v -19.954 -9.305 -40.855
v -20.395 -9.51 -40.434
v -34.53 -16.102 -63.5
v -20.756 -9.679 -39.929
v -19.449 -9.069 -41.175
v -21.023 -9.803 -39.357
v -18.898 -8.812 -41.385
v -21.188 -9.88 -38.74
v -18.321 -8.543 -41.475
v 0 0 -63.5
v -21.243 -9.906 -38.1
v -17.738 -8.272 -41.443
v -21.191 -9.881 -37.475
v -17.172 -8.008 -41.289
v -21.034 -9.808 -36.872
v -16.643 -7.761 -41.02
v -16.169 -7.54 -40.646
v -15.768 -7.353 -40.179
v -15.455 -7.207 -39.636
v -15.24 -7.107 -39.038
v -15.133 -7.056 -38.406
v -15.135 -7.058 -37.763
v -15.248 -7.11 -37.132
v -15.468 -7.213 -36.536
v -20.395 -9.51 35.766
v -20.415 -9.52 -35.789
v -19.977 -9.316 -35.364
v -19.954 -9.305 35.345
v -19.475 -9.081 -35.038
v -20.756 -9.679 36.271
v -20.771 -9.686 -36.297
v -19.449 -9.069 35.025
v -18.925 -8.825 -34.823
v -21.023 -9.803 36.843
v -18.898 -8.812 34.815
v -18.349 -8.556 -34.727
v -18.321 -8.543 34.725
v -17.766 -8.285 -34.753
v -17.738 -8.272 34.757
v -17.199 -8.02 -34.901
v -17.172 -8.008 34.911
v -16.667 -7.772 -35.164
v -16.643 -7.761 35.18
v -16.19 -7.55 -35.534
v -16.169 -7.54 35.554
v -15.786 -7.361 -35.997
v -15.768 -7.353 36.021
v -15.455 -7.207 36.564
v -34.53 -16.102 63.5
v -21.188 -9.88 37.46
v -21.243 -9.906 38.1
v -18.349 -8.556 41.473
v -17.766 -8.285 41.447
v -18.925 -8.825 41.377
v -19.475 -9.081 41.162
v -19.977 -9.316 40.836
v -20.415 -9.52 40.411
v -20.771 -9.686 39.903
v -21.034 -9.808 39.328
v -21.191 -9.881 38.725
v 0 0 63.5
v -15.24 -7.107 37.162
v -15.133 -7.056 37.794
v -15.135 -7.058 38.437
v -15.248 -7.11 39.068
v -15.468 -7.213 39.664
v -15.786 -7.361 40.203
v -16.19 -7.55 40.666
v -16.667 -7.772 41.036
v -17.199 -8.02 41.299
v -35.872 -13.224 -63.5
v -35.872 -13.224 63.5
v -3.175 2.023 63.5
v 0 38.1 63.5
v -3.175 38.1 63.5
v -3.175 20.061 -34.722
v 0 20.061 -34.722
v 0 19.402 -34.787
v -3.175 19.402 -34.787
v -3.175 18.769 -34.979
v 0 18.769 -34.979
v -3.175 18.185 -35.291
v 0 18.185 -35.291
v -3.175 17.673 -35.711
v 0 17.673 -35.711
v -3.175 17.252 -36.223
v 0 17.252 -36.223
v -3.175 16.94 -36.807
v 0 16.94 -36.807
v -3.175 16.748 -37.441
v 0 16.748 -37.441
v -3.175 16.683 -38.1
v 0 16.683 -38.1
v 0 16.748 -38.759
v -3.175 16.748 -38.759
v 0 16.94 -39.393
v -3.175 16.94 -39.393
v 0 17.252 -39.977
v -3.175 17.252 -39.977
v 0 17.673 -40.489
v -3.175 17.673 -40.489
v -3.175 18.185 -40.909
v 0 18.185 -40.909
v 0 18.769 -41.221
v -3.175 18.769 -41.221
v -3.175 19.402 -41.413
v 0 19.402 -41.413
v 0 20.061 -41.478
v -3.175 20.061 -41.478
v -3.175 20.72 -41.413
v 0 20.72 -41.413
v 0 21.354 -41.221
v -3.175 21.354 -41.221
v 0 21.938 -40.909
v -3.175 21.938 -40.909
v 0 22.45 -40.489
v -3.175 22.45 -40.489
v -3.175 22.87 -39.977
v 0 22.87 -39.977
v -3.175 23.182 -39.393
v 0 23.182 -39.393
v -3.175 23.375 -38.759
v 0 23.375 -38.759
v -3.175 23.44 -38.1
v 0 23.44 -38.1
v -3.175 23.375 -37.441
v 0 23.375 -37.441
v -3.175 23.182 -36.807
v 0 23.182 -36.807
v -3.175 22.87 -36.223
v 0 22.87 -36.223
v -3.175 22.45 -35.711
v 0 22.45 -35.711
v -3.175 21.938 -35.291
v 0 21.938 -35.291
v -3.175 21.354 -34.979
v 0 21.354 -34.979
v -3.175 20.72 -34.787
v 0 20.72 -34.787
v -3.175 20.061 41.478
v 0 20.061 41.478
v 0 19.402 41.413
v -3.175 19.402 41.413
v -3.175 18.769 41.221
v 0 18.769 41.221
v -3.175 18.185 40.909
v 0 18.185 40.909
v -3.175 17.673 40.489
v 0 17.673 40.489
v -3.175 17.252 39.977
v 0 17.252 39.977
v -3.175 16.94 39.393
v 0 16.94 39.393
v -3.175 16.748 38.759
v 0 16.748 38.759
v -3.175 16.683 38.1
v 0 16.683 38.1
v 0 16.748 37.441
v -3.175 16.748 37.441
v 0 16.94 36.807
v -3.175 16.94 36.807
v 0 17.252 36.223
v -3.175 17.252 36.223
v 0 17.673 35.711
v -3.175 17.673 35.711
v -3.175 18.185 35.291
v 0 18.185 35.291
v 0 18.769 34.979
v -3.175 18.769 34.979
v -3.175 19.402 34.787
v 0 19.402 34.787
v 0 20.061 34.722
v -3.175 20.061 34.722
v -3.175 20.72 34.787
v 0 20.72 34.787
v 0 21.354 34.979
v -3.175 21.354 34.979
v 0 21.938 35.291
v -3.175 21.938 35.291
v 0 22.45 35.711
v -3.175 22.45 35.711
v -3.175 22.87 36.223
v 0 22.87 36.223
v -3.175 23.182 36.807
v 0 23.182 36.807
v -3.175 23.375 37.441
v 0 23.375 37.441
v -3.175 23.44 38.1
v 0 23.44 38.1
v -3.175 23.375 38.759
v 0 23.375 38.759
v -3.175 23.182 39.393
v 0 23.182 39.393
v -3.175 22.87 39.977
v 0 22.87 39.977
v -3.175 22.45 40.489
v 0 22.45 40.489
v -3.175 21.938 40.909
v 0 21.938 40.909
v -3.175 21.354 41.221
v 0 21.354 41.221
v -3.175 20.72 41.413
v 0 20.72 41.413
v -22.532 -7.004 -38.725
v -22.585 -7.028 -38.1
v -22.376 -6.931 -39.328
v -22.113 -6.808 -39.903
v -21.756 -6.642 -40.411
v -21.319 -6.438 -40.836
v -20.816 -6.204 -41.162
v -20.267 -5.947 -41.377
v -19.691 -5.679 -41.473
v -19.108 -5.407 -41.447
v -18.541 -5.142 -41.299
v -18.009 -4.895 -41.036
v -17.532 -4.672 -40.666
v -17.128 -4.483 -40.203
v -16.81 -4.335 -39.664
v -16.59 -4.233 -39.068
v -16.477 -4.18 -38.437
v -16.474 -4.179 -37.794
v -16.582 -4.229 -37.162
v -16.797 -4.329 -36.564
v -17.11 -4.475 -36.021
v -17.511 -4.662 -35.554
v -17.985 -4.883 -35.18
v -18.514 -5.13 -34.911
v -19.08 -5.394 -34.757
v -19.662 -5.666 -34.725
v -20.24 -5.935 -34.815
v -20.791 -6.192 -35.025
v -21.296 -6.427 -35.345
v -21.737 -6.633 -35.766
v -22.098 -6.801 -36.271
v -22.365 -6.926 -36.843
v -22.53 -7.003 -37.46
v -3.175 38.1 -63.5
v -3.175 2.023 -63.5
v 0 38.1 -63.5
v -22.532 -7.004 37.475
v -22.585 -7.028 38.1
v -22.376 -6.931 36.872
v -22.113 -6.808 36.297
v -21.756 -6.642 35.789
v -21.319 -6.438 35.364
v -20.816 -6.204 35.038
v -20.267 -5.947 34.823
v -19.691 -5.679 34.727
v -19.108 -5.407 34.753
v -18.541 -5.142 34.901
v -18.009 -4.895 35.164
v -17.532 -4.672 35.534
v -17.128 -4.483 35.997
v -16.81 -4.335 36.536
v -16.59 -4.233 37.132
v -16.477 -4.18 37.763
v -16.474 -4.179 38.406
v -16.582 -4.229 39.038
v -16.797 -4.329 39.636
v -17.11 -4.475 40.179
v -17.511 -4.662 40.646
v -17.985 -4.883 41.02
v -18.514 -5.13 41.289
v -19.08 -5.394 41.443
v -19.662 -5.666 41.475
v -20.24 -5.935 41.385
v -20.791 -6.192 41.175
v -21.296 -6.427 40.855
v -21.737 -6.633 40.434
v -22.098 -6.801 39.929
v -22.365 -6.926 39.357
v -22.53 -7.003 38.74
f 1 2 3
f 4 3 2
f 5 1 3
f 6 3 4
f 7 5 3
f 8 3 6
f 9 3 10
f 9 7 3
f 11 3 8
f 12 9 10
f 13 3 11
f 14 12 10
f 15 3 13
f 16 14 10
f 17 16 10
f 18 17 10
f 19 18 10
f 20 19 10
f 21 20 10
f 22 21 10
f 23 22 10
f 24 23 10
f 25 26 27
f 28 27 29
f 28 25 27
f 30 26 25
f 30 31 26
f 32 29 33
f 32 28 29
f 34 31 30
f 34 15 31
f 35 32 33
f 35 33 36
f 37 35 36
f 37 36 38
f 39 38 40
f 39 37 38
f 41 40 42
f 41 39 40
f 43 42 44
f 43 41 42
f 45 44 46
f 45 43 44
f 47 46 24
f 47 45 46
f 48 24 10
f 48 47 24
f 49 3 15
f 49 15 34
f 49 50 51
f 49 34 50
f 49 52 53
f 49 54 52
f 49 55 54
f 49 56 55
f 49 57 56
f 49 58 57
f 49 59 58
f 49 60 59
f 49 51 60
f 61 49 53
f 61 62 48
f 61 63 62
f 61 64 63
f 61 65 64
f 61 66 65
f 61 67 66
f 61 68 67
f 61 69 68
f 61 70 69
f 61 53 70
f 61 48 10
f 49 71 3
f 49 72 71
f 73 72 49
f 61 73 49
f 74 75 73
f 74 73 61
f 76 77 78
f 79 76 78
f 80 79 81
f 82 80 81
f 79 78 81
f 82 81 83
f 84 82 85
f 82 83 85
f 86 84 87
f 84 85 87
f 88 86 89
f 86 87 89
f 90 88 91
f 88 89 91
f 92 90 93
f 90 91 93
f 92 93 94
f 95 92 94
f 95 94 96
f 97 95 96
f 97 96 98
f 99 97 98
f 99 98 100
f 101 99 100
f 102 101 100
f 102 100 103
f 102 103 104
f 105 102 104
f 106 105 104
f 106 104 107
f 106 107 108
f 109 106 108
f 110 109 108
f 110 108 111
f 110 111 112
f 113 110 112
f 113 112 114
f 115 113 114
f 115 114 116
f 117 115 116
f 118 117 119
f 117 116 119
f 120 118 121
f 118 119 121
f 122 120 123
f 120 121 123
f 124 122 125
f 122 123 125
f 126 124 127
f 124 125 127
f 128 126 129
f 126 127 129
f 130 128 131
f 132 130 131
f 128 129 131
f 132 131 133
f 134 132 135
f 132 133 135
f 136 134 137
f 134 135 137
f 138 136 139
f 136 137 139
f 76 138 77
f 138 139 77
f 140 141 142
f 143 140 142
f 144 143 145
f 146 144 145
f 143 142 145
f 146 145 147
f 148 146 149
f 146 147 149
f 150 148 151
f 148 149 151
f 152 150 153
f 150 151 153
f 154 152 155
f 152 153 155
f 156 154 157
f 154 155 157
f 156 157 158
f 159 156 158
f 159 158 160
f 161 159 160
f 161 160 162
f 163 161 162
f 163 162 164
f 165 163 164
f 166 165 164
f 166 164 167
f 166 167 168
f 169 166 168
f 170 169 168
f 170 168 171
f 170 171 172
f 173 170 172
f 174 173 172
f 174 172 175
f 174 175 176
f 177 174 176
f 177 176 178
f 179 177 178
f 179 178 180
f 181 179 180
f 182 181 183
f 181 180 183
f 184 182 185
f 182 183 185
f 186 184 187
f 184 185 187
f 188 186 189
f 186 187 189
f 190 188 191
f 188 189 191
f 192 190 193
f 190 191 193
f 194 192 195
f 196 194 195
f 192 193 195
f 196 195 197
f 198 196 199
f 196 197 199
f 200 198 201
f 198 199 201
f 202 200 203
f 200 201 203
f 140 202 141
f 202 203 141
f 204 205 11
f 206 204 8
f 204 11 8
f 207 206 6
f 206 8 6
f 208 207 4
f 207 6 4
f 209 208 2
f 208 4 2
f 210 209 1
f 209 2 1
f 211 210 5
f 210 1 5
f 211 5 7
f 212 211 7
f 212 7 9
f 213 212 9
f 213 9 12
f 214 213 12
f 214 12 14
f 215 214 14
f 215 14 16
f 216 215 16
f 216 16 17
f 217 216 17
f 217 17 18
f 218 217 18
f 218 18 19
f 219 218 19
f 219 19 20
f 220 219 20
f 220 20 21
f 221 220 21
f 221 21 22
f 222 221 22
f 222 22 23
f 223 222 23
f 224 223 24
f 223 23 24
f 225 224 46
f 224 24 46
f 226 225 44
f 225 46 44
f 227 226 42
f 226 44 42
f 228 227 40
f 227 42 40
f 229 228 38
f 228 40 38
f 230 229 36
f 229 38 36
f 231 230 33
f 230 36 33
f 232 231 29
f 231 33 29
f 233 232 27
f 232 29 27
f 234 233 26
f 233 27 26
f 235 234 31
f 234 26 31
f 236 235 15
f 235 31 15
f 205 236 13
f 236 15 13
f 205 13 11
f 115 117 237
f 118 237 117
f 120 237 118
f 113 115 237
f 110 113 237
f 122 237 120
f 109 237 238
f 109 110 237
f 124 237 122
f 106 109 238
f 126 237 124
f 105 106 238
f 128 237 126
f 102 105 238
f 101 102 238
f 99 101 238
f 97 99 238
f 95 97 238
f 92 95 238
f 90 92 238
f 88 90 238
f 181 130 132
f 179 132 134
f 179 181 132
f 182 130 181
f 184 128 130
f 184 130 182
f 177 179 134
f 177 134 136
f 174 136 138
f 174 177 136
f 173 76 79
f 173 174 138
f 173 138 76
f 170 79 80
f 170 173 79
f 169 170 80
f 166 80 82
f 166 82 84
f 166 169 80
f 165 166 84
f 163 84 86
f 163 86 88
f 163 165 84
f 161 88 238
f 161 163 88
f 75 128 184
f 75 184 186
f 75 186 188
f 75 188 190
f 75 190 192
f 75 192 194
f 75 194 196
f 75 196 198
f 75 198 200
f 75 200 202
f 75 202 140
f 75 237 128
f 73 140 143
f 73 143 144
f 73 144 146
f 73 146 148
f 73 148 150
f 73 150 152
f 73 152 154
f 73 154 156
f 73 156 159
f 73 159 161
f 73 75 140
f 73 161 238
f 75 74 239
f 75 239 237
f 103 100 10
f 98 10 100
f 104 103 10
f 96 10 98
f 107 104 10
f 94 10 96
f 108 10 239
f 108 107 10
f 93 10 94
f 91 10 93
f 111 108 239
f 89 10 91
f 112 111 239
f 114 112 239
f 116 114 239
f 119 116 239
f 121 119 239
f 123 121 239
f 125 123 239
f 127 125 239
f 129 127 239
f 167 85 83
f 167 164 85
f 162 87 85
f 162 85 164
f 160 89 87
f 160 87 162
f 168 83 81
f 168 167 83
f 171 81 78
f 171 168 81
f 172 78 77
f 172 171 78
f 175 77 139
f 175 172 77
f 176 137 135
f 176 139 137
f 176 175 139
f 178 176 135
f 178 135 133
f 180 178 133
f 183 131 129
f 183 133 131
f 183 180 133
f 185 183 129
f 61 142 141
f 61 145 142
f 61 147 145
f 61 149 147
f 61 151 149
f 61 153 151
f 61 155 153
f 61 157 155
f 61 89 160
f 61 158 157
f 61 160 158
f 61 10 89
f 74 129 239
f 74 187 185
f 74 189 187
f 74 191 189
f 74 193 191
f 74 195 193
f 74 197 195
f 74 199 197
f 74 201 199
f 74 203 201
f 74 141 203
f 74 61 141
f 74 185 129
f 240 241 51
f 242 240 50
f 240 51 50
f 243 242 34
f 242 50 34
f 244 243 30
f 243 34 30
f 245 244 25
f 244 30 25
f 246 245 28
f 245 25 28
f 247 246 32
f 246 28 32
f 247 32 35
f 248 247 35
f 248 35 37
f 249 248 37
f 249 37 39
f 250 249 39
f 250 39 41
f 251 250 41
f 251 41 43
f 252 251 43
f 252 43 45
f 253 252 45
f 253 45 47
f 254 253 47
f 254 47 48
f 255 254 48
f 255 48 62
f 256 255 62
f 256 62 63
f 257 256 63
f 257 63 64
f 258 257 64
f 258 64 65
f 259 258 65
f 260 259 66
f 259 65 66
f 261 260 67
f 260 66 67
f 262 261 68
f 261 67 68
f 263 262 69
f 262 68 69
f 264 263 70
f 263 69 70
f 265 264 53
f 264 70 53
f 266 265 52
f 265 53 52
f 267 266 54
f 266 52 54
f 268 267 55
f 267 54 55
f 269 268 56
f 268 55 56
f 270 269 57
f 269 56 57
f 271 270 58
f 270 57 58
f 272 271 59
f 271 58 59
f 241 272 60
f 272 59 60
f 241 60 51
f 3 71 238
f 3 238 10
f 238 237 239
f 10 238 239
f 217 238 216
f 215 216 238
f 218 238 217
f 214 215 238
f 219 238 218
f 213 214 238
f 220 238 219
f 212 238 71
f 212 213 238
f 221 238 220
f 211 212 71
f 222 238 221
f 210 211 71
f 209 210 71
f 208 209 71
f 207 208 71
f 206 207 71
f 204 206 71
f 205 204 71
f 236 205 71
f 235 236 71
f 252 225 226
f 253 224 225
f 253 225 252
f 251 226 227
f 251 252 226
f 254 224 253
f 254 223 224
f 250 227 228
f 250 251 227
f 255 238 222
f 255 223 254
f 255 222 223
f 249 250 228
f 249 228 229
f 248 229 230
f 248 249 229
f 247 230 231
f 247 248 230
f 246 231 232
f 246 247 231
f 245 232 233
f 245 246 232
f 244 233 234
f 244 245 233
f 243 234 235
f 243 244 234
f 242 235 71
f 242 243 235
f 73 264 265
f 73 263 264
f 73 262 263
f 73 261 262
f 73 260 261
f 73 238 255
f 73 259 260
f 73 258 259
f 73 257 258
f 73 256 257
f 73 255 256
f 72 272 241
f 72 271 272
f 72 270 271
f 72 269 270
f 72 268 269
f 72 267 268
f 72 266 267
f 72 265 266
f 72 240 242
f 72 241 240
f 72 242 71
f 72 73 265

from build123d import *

# Parameters (mm, degrees)
BOSS_EXTRUDE1_DEPTH               = 63.5
F_1_4_CLEARANCE_HOLE1_D           = 6.7564
F_1_4_CLEARANCE_HOLE1_ON_FACE_2_D = 6.7564


with BuildPart() as part:
    # Sketch1 → Boss-Extrude1 (new body, symmetric)
    with BuildSketch(Plane.XY):
        Polygon((0, 0), (0, 38.1), (-3.175, 38.1), (-3.175, 2.022698078), (-35.872139667, -13.224228548), (-34.530326686, -16.101755772), align=None)
    extrude(amount=BOSS_EXTRUDE1_DEPTH, both=True)

    # 1/4 Clearance Hole1 (through all)
    with Locations(Plane(origin=(-3.175, 20.061349039, -38.1), x_dir=(0, 0, -1), z_dir=(-1, 0, 0))):
        with Locations((0, 0), (-76.2, 0)):
            Hole(F_1_4_CLEARANCE_HOLE1_D / 2)

    # 1/4 Clearance Hole1 on face 2 (through all)
    with Locations(Plane(origin=(-19.523569834, -5.600765235, -38.1), x_dir=(0.906307925, 0.422617965, 0), z_dir=(-0.422617965, 0.906307925, 0))):
        with Locations((0, 0), (0, -76.2)):
            Hole(F_1_4_CLEARANCE_HOLE1_ON_FACE_2_D / 2)


solid = part.part
